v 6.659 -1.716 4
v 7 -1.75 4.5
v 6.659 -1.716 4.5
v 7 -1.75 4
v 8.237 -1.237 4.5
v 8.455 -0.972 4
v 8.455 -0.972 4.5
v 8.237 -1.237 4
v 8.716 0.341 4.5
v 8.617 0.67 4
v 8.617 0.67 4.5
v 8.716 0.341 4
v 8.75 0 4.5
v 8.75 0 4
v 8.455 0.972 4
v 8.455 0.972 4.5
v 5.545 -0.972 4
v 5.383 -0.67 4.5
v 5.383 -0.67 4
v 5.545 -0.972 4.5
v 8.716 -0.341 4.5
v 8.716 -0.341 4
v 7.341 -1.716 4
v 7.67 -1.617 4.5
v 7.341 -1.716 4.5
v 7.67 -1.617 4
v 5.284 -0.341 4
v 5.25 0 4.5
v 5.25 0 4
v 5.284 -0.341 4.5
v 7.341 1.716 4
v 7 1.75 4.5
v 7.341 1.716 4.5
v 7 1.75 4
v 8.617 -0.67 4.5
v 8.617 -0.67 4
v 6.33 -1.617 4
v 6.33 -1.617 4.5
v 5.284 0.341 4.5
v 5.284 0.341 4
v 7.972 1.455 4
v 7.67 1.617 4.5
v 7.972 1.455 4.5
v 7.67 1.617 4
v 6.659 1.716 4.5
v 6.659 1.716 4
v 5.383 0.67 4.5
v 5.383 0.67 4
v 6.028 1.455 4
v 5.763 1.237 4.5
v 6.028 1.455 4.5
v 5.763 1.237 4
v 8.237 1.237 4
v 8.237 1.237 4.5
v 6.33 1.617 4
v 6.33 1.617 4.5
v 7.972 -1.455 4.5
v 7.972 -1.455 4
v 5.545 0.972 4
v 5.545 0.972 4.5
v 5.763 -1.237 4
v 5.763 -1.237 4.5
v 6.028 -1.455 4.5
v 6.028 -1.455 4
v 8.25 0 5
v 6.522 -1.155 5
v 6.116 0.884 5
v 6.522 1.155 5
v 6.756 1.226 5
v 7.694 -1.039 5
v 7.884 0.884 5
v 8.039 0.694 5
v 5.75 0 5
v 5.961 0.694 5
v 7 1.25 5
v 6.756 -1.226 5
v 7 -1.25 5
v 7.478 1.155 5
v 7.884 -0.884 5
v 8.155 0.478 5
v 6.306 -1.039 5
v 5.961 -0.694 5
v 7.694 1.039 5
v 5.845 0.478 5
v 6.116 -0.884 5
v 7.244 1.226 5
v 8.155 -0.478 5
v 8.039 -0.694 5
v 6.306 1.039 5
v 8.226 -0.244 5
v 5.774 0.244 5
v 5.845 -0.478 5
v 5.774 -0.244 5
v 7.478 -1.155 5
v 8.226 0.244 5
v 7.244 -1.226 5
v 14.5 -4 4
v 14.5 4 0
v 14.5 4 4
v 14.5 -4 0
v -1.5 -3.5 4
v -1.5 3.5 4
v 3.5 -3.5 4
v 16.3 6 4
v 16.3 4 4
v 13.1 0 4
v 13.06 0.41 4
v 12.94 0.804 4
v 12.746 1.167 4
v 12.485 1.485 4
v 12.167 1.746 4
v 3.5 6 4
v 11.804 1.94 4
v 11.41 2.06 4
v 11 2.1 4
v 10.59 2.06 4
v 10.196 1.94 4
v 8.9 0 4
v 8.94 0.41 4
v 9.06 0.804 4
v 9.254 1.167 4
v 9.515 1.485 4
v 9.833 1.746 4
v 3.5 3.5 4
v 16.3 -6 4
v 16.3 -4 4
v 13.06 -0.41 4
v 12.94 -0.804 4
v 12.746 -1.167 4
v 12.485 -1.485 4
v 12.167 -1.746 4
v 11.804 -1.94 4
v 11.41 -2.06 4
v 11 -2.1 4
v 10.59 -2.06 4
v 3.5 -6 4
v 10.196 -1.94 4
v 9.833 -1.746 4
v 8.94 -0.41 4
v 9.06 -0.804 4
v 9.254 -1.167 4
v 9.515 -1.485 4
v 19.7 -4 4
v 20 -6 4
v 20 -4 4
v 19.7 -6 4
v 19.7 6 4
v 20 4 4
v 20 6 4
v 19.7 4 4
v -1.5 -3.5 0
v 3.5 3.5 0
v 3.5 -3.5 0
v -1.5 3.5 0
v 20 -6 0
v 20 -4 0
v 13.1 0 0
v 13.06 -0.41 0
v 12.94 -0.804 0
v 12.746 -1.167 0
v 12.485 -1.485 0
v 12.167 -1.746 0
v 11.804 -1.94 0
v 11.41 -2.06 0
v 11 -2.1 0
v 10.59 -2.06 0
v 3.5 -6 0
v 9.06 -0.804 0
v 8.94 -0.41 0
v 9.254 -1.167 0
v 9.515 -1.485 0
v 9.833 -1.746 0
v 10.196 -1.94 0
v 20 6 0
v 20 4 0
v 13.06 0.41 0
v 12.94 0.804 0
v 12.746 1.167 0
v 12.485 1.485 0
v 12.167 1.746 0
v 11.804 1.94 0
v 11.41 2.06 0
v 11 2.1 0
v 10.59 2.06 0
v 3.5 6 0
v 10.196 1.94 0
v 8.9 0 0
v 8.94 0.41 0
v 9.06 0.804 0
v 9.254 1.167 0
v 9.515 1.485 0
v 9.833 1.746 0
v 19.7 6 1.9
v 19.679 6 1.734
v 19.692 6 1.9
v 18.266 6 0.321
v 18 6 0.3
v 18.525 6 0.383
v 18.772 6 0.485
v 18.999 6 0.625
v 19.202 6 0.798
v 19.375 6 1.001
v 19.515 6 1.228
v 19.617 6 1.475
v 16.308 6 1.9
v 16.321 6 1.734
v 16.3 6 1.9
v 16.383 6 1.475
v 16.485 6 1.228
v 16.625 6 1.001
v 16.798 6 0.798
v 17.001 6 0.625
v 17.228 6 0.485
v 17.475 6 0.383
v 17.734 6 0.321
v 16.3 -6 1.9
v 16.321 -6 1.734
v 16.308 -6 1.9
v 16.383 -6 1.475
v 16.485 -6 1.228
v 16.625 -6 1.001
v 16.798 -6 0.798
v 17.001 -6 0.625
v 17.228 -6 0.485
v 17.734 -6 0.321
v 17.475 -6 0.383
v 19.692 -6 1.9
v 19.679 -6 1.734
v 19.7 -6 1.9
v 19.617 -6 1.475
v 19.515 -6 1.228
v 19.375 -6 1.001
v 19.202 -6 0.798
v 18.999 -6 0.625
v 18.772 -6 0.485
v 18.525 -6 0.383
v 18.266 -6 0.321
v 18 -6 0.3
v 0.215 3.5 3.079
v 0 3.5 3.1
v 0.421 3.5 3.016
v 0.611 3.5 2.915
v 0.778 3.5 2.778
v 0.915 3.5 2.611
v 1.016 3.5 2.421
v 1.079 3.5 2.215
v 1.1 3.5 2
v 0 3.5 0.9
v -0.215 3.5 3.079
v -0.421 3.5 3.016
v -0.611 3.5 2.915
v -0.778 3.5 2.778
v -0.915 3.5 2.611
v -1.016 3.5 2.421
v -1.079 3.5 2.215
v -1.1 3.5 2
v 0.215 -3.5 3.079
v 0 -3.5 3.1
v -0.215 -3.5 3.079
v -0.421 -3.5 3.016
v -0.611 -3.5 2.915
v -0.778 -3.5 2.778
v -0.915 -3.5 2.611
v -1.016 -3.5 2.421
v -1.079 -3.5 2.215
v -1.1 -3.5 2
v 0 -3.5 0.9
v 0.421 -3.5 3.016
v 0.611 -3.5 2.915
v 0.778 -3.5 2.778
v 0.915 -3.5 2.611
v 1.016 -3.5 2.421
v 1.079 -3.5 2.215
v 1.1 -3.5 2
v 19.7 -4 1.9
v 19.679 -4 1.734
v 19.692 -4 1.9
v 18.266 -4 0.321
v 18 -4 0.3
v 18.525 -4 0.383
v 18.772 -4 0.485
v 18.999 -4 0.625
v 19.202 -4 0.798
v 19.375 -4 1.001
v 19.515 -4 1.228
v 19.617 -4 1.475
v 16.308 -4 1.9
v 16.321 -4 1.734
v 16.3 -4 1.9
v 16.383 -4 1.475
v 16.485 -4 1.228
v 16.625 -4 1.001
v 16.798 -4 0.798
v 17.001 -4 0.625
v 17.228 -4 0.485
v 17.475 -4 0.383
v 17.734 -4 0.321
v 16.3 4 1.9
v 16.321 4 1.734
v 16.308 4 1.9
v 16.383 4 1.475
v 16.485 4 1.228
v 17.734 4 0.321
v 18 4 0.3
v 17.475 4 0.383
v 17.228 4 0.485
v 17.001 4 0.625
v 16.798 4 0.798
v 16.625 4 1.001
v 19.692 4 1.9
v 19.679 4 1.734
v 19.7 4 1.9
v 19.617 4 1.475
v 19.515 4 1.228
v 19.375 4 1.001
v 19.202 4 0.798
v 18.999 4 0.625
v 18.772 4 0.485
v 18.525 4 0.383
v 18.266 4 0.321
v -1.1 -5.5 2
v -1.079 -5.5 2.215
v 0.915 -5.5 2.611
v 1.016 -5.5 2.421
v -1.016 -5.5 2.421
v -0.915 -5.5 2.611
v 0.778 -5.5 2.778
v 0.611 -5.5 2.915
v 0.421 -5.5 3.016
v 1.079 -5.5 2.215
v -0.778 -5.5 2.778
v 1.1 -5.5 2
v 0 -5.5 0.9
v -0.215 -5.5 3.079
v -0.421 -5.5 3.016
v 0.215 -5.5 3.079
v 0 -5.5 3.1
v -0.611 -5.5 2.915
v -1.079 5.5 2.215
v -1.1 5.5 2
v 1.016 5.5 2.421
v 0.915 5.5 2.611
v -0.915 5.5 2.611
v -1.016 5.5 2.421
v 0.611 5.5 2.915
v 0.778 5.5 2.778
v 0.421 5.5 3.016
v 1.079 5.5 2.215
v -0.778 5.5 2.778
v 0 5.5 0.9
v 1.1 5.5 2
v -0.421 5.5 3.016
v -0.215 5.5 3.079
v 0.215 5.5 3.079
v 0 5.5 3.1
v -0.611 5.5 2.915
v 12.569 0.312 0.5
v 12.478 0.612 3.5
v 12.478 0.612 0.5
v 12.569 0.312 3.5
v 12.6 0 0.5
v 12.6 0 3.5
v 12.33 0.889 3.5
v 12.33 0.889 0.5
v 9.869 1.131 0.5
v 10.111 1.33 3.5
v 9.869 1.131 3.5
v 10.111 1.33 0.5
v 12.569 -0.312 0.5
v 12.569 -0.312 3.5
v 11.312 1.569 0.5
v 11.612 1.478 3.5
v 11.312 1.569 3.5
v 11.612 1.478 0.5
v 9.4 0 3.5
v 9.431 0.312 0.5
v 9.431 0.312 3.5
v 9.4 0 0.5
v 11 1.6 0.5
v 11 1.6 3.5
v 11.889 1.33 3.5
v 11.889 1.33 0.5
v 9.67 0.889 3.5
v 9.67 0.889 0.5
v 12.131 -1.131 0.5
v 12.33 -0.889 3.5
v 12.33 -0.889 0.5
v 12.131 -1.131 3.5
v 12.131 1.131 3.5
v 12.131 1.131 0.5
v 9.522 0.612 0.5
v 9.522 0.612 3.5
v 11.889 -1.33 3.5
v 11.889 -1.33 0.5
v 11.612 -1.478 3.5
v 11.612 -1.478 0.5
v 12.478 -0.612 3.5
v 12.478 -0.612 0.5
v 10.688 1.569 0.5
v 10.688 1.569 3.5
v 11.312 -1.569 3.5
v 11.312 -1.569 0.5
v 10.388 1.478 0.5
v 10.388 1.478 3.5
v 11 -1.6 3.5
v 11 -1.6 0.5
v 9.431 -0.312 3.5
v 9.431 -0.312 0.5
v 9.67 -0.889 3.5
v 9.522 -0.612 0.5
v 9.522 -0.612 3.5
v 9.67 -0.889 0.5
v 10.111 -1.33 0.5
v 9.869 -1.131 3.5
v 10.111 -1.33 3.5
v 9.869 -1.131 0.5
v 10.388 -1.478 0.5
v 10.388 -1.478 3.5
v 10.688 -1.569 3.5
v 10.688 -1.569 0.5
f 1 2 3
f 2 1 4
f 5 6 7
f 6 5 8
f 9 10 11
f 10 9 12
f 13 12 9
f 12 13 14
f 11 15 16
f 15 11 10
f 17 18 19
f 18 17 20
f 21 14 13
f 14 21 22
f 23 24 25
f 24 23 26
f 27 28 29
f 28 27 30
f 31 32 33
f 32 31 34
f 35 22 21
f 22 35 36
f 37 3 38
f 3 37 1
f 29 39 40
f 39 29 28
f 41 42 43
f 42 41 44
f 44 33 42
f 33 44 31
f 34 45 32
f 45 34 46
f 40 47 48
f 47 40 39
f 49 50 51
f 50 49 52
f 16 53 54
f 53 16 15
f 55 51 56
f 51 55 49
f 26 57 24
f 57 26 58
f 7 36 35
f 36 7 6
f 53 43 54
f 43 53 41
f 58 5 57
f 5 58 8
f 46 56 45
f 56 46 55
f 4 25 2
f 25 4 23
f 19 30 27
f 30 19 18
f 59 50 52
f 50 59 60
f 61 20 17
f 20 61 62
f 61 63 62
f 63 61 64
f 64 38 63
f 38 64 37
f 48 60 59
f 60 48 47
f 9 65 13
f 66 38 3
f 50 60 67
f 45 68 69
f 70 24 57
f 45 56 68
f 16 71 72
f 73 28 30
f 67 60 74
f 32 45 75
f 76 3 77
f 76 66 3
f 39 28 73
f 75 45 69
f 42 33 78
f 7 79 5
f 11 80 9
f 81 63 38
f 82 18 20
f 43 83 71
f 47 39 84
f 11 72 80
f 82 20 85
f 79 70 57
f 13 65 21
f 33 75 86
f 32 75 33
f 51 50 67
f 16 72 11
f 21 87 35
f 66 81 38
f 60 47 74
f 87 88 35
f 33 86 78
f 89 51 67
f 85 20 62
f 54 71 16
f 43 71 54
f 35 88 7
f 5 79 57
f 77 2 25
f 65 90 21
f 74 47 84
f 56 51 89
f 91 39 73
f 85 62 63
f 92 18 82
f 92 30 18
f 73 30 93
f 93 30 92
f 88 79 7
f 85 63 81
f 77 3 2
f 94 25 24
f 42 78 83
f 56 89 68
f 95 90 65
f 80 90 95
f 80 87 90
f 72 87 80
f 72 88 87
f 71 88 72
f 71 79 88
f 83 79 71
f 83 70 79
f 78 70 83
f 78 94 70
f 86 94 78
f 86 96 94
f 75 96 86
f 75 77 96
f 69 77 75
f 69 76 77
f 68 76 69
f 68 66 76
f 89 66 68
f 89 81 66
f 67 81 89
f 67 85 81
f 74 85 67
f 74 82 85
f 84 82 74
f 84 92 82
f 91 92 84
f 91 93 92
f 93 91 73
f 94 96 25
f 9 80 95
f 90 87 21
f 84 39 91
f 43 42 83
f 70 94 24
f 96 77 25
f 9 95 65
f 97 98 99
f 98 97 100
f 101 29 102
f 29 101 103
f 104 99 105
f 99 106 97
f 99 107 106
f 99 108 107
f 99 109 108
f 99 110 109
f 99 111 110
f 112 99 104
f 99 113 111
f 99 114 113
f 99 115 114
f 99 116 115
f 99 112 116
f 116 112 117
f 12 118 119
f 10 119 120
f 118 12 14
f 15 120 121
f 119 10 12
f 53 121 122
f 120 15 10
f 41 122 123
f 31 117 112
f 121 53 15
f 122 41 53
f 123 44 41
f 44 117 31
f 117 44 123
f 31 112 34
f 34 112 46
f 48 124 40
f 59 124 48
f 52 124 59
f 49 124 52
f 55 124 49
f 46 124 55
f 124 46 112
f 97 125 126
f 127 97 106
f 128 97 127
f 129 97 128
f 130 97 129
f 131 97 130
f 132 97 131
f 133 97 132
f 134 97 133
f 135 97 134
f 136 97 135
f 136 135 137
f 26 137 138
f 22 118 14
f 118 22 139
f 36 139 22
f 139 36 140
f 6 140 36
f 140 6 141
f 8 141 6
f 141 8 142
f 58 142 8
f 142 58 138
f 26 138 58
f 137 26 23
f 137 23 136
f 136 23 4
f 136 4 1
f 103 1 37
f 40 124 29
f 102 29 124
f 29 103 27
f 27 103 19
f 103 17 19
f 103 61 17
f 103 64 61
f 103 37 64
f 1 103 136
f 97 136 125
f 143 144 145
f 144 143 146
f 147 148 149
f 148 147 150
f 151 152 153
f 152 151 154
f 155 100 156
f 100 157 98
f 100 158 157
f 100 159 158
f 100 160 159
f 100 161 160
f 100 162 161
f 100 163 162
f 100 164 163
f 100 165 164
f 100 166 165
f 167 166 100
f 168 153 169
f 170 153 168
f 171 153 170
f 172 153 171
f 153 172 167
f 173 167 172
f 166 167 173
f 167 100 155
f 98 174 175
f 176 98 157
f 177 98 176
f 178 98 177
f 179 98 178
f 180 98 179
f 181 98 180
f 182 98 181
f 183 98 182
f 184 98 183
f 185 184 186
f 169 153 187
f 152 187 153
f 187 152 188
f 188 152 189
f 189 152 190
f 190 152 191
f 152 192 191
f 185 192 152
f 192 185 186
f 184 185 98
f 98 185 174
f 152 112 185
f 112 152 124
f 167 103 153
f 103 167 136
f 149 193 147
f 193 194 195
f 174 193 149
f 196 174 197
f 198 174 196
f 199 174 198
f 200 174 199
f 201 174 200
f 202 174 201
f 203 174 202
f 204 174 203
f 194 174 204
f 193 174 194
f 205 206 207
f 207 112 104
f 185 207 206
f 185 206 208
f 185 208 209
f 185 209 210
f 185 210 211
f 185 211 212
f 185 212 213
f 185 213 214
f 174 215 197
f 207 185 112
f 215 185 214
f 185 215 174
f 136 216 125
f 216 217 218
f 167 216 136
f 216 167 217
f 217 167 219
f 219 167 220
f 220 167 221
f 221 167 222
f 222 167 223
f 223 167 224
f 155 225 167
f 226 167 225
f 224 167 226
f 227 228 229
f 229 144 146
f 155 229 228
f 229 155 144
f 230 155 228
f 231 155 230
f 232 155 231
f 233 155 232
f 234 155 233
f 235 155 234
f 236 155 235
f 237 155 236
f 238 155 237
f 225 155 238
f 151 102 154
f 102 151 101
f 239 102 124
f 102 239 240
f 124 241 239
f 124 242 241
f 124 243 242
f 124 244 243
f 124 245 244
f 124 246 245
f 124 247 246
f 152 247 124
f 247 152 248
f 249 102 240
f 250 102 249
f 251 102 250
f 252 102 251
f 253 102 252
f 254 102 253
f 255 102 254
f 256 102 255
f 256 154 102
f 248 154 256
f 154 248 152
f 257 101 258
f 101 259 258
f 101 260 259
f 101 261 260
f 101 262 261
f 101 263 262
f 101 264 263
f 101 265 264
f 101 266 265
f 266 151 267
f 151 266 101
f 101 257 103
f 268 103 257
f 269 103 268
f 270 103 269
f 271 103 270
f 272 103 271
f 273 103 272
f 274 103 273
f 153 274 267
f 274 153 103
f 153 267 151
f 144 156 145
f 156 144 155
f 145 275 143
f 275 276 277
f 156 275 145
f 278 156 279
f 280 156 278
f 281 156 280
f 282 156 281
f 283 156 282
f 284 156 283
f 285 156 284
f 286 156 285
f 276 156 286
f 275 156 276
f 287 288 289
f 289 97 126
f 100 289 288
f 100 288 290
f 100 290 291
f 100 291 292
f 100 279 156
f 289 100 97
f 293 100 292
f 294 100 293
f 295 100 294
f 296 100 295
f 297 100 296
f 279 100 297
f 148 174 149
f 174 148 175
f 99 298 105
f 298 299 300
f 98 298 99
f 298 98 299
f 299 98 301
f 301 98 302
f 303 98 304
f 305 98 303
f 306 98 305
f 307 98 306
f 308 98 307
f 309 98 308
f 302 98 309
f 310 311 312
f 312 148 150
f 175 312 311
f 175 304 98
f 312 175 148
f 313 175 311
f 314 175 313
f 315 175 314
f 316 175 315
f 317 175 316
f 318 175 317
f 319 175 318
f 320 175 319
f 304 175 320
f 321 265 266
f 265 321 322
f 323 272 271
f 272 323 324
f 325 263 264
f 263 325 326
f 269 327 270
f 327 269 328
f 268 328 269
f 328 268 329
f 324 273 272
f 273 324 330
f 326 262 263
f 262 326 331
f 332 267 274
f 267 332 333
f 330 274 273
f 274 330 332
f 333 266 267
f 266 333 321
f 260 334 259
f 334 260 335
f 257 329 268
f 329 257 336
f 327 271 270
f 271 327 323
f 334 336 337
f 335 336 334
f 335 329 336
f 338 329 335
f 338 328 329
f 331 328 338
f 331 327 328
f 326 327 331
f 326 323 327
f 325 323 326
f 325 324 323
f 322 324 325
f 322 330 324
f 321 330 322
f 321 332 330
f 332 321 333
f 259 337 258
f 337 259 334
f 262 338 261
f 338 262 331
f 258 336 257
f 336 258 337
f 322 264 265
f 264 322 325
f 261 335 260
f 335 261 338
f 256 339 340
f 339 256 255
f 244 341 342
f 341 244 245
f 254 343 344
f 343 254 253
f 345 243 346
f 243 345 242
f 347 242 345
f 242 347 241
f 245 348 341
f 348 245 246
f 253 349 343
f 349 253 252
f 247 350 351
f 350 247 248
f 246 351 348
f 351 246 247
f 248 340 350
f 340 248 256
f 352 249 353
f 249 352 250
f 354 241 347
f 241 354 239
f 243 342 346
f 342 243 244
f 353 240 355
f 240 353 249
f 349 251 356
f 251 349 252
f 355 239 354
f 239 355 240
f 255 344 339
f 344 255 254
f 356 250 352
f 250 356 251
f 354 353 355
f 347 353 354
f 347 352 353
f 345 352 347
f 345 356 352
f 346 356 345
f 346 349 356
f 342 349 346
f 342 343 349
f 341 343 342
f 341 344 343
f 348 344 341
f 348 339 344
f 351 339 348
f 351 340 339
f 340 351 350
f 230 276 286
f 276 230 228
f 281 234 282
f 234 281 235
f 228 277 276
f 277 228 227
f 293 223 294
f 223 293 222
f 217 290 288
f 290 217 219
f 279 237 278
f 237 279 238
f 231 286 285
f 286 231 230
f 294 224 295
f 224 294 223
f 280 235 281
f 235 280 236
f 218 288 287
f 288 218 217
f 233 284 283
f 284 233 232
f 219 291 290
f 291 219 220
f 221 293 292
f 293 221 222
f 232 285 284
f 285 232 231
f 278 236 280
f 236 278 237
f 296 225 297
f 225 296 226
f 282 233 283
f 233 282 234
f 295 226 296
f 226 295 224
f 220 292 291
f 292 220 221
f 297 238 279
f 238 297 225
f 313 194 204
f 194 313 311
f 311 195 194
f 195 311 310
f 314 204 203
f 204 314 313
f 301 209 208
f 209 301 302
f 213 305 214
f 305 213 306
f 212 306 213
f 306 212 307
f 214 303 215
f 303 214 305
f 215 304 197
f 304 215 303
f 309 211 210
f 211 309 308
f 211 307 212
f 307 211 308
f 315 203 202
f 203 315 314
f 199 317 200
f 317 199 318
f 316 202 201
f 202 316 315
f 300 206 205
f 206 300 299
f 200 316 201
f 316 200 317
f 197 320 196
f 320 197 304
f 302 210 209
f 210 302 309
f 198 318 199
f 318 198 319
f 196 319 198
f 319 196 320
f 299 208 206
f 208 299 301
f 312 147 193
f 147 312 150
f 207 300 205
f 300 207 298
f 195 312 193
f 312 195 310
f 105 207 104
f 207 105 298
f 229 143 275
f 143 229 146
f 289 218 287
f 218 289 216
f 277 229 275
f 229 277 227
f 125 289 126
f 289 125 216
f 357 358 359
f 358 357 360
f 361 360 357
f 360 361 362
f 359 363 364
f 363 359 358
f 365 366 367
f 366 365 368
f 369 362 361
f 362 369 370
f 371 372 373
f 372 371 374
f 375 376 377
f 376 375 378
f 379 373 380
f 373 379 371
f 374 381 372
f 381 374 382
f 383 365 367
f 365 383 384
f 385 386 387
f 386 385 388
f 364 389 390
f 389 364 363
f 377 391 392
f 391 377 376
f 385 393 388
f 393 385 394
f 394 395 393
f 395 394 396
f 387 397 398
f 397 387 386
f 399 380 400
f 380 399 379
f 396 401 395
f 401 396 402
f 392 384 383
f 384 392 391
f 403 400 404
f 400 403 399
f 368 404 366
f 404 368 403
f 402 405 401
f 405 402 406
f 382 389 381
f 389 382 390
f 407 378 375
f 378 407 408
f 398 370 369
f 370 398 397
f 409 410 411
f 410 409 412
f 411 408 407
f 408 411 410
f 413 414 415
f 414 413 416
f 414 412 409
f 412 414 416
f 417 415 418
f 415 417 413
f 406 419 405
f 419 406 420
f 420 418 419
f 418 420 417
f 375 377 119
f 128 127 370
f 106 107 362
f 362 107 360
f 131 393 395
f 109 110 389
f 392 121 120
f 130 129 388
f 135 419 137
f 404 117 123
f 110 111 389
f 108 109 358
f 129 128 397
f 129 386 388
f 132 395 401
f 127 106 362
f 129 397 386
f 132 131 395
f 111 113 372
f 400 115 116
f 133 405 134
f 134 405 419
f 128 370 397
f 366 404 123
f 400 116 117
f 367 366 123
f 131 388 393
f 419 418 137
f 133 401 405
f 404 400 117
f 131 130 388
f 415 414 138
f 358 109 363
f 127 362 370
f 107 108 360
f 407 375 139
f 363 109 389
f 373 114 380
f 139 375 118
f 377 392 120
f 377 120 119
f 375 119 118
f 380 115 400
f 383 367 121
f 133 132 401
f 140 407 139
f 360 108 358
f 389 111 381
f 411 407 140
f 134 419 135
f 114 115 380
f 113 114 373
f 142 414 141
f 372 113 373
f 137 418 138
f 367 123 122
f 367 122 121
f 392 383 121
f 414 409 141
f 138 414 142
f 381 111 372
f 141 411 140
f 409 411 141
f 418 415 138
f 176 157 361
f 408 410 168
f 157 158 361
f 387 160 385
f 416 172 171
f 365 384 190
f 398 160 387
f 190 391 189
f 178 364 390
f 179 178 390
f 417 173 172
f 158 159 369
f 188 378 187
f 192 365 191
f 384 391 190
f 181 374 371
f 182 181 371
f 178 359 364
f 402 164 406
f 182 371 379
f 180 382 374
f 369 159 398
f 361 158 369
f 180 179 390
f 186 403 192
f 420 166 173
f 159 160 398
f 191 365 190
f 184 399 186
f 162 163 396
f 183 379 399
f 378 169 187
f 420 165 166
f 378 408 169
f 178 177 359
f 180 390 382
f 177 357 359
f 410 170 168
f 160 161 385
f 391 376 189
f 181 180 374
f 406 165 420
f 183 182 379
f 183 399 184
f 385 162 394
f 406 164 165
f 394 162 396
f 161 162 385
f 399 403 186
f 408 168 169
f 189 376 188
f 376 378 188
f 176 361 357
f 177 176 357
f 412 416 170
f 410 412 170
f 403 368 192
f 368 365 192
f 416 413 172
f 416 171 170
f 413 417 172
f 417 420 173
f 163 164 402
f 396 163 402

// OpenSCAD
// Bracelet of hinged links, printed in place (3-link sample of a 10-link chain)
part = "link"; // ["link", "assembly"]
cadverify_only = "";
module instance(name, part, unit = 1) {
    echo(cadverify_instance = [name, part, unit]);
    if (cadverify_only == "" || cadverify_only == name) children();
}
// link: pitch 18 (X), width 12 (Y), body 4 thick + 1 snap stud = 5
// hinge: teardrop pin (r1.1) in U-cradle (r1.7, open at top), 0.6 clearance
P = 18; W = 12; Zc = 2.0;
Rp = 1.1; Rh = 1.7; SlotH = 1.7;
Ytong = 3.5;
Xrear = -1.5; Xsr = 3.5; Xsf = 14.5; Xlr = 13.5; Xfront = 20;
XpinF = 18;
studX = 7; studR = 1.75;
holeX = 11; holeR = 1.6;
module teardrop2D() {
    pts = concat([for (a=[0:180/16:180]) [Rp*cos(a), Zc+Rp*sin(a)]], [[0, Zc-Rp]]);
    polygon(pts);
}
module pin_stub(len) { linear_extrude(height=len) teardrop2D(); }
module stud_solid() {
    translate([studX, 0, 3.9]) cylinder(r=studR, h=0.6, $fn=32);
    translate([studX, 0, 4.5]) cylinder(r1=studR, r2=1.25, h=0.5, $fn=32);
}
module link() {
    difference() {
        union() {
            translate([Xsr, -6, 0]) cube([Xsf-Xsr, 12, 4]);
            translate([Xrear, -Ytong, 0]) cube([(4.5-Xrear), 7, 4]);
            translate([Xlr, -6, 0]) cube([Xfront-Xlr, 2, 4]);
            translate([Xlr, 4, 0]) cube([Xfront-Xlr, 2, 4]);
            translate([0, -2.5, 0]) rotate([90,0,0]) pin_stub(3.0);
            translate([0, 5.5, 0]) rotate([90,0,0]) pin_stub(3.0);
            stud_solid();
        }
        translate([XpinF, -6.1, Zc]) rotate([-90,0,0]) cylinder(r=Rh, h=2.2, $fn=40);
        translate([XpinF, 3.9, Zc]) rotate([-90,0,0]) cylinder(r=Rh, h=2.2, $fn=40);
        translate([XpinF-SlotH, 3.9, 1.9]) cube([2*SlotH, 2.2, 2.2]);
        translate([XpinF-SlotH, -6.1, 1.9]) cube([2*SlotH, 2.2, 2.2]);
        translate([holeX, 0, -0.1]) cylinder(r=holeR, h=4.2, $fn=32);
        translate([holeX, 0, 3.5]) cylinder(r1=holeR, r2=2.1, h=0.5, $fn=32);
        translate([holeX, 0, 0]) cylinder(r1=2.1, r2=holeR, h=0.5, $fn=32);
    }
}
if (part == "assembly") {
    echo(cadverify_spec = [
        ["bounds", [[-1.5, -6, 0], [56, 6, 5]]],
        ["support_faces", [["bed", "-z", 300]]],
        ["allowed_interferences", []],
        ["motions", [["joint_bend", ["link3"], "rotate", [36, 0, 2], [0, 1, 0], [-30, 30]]]],
        ["assembly_order", [[["link1"], [0, 0, 0]], [["link2"], [0, 0, -1]], [["link3"], [0, 0, -1]]]],
        ["print_in_place", 0.5],
        ["overhangs_allowed", []]
    ]);
    instance("link1", "link", 1) translate([0, 0, 0]) link();
    instance("link2", "link", 1) translate([18, 0, 0]) link();
    instance("link3", "link", 1) translate([36, 0, 0]) link();
} else {
    echo(cadverify_spec = [
        ["bounds", [[-1.5, -6, 0], [20, 6, 5]]],
        ["bodies", 1],
        ["through_holes", 1],
        ["support_faces", [["bed", "-z", 100]]],
        ["overhangs_allowed", []],
        ["copies", 3],
        ["details", [
            ["spine", "material", [[5, -5, 0], [9, 5, 4]], 0.9],
            ["slot", "void", [[14.5, -4, 0], [20, 4, 4]], 0.9],
            ["cradle", "void", [[16.3, 4, 1.9], [19.7, 6.1, 4.1]], 0.9],
            ["snap_hole", "hole", [11, 0, 6], [0, 0, -1], [[0, 4.2], [0.5, 3.2], [3.5, 3.2]]],
            ["floor", "thickness", [9, 3, -1], [0, 0, 1], 4],
            ["snap", "view", [[5, -2, 4], [9, 2, 5]]]
        ]]
    ]);
    link();
}
